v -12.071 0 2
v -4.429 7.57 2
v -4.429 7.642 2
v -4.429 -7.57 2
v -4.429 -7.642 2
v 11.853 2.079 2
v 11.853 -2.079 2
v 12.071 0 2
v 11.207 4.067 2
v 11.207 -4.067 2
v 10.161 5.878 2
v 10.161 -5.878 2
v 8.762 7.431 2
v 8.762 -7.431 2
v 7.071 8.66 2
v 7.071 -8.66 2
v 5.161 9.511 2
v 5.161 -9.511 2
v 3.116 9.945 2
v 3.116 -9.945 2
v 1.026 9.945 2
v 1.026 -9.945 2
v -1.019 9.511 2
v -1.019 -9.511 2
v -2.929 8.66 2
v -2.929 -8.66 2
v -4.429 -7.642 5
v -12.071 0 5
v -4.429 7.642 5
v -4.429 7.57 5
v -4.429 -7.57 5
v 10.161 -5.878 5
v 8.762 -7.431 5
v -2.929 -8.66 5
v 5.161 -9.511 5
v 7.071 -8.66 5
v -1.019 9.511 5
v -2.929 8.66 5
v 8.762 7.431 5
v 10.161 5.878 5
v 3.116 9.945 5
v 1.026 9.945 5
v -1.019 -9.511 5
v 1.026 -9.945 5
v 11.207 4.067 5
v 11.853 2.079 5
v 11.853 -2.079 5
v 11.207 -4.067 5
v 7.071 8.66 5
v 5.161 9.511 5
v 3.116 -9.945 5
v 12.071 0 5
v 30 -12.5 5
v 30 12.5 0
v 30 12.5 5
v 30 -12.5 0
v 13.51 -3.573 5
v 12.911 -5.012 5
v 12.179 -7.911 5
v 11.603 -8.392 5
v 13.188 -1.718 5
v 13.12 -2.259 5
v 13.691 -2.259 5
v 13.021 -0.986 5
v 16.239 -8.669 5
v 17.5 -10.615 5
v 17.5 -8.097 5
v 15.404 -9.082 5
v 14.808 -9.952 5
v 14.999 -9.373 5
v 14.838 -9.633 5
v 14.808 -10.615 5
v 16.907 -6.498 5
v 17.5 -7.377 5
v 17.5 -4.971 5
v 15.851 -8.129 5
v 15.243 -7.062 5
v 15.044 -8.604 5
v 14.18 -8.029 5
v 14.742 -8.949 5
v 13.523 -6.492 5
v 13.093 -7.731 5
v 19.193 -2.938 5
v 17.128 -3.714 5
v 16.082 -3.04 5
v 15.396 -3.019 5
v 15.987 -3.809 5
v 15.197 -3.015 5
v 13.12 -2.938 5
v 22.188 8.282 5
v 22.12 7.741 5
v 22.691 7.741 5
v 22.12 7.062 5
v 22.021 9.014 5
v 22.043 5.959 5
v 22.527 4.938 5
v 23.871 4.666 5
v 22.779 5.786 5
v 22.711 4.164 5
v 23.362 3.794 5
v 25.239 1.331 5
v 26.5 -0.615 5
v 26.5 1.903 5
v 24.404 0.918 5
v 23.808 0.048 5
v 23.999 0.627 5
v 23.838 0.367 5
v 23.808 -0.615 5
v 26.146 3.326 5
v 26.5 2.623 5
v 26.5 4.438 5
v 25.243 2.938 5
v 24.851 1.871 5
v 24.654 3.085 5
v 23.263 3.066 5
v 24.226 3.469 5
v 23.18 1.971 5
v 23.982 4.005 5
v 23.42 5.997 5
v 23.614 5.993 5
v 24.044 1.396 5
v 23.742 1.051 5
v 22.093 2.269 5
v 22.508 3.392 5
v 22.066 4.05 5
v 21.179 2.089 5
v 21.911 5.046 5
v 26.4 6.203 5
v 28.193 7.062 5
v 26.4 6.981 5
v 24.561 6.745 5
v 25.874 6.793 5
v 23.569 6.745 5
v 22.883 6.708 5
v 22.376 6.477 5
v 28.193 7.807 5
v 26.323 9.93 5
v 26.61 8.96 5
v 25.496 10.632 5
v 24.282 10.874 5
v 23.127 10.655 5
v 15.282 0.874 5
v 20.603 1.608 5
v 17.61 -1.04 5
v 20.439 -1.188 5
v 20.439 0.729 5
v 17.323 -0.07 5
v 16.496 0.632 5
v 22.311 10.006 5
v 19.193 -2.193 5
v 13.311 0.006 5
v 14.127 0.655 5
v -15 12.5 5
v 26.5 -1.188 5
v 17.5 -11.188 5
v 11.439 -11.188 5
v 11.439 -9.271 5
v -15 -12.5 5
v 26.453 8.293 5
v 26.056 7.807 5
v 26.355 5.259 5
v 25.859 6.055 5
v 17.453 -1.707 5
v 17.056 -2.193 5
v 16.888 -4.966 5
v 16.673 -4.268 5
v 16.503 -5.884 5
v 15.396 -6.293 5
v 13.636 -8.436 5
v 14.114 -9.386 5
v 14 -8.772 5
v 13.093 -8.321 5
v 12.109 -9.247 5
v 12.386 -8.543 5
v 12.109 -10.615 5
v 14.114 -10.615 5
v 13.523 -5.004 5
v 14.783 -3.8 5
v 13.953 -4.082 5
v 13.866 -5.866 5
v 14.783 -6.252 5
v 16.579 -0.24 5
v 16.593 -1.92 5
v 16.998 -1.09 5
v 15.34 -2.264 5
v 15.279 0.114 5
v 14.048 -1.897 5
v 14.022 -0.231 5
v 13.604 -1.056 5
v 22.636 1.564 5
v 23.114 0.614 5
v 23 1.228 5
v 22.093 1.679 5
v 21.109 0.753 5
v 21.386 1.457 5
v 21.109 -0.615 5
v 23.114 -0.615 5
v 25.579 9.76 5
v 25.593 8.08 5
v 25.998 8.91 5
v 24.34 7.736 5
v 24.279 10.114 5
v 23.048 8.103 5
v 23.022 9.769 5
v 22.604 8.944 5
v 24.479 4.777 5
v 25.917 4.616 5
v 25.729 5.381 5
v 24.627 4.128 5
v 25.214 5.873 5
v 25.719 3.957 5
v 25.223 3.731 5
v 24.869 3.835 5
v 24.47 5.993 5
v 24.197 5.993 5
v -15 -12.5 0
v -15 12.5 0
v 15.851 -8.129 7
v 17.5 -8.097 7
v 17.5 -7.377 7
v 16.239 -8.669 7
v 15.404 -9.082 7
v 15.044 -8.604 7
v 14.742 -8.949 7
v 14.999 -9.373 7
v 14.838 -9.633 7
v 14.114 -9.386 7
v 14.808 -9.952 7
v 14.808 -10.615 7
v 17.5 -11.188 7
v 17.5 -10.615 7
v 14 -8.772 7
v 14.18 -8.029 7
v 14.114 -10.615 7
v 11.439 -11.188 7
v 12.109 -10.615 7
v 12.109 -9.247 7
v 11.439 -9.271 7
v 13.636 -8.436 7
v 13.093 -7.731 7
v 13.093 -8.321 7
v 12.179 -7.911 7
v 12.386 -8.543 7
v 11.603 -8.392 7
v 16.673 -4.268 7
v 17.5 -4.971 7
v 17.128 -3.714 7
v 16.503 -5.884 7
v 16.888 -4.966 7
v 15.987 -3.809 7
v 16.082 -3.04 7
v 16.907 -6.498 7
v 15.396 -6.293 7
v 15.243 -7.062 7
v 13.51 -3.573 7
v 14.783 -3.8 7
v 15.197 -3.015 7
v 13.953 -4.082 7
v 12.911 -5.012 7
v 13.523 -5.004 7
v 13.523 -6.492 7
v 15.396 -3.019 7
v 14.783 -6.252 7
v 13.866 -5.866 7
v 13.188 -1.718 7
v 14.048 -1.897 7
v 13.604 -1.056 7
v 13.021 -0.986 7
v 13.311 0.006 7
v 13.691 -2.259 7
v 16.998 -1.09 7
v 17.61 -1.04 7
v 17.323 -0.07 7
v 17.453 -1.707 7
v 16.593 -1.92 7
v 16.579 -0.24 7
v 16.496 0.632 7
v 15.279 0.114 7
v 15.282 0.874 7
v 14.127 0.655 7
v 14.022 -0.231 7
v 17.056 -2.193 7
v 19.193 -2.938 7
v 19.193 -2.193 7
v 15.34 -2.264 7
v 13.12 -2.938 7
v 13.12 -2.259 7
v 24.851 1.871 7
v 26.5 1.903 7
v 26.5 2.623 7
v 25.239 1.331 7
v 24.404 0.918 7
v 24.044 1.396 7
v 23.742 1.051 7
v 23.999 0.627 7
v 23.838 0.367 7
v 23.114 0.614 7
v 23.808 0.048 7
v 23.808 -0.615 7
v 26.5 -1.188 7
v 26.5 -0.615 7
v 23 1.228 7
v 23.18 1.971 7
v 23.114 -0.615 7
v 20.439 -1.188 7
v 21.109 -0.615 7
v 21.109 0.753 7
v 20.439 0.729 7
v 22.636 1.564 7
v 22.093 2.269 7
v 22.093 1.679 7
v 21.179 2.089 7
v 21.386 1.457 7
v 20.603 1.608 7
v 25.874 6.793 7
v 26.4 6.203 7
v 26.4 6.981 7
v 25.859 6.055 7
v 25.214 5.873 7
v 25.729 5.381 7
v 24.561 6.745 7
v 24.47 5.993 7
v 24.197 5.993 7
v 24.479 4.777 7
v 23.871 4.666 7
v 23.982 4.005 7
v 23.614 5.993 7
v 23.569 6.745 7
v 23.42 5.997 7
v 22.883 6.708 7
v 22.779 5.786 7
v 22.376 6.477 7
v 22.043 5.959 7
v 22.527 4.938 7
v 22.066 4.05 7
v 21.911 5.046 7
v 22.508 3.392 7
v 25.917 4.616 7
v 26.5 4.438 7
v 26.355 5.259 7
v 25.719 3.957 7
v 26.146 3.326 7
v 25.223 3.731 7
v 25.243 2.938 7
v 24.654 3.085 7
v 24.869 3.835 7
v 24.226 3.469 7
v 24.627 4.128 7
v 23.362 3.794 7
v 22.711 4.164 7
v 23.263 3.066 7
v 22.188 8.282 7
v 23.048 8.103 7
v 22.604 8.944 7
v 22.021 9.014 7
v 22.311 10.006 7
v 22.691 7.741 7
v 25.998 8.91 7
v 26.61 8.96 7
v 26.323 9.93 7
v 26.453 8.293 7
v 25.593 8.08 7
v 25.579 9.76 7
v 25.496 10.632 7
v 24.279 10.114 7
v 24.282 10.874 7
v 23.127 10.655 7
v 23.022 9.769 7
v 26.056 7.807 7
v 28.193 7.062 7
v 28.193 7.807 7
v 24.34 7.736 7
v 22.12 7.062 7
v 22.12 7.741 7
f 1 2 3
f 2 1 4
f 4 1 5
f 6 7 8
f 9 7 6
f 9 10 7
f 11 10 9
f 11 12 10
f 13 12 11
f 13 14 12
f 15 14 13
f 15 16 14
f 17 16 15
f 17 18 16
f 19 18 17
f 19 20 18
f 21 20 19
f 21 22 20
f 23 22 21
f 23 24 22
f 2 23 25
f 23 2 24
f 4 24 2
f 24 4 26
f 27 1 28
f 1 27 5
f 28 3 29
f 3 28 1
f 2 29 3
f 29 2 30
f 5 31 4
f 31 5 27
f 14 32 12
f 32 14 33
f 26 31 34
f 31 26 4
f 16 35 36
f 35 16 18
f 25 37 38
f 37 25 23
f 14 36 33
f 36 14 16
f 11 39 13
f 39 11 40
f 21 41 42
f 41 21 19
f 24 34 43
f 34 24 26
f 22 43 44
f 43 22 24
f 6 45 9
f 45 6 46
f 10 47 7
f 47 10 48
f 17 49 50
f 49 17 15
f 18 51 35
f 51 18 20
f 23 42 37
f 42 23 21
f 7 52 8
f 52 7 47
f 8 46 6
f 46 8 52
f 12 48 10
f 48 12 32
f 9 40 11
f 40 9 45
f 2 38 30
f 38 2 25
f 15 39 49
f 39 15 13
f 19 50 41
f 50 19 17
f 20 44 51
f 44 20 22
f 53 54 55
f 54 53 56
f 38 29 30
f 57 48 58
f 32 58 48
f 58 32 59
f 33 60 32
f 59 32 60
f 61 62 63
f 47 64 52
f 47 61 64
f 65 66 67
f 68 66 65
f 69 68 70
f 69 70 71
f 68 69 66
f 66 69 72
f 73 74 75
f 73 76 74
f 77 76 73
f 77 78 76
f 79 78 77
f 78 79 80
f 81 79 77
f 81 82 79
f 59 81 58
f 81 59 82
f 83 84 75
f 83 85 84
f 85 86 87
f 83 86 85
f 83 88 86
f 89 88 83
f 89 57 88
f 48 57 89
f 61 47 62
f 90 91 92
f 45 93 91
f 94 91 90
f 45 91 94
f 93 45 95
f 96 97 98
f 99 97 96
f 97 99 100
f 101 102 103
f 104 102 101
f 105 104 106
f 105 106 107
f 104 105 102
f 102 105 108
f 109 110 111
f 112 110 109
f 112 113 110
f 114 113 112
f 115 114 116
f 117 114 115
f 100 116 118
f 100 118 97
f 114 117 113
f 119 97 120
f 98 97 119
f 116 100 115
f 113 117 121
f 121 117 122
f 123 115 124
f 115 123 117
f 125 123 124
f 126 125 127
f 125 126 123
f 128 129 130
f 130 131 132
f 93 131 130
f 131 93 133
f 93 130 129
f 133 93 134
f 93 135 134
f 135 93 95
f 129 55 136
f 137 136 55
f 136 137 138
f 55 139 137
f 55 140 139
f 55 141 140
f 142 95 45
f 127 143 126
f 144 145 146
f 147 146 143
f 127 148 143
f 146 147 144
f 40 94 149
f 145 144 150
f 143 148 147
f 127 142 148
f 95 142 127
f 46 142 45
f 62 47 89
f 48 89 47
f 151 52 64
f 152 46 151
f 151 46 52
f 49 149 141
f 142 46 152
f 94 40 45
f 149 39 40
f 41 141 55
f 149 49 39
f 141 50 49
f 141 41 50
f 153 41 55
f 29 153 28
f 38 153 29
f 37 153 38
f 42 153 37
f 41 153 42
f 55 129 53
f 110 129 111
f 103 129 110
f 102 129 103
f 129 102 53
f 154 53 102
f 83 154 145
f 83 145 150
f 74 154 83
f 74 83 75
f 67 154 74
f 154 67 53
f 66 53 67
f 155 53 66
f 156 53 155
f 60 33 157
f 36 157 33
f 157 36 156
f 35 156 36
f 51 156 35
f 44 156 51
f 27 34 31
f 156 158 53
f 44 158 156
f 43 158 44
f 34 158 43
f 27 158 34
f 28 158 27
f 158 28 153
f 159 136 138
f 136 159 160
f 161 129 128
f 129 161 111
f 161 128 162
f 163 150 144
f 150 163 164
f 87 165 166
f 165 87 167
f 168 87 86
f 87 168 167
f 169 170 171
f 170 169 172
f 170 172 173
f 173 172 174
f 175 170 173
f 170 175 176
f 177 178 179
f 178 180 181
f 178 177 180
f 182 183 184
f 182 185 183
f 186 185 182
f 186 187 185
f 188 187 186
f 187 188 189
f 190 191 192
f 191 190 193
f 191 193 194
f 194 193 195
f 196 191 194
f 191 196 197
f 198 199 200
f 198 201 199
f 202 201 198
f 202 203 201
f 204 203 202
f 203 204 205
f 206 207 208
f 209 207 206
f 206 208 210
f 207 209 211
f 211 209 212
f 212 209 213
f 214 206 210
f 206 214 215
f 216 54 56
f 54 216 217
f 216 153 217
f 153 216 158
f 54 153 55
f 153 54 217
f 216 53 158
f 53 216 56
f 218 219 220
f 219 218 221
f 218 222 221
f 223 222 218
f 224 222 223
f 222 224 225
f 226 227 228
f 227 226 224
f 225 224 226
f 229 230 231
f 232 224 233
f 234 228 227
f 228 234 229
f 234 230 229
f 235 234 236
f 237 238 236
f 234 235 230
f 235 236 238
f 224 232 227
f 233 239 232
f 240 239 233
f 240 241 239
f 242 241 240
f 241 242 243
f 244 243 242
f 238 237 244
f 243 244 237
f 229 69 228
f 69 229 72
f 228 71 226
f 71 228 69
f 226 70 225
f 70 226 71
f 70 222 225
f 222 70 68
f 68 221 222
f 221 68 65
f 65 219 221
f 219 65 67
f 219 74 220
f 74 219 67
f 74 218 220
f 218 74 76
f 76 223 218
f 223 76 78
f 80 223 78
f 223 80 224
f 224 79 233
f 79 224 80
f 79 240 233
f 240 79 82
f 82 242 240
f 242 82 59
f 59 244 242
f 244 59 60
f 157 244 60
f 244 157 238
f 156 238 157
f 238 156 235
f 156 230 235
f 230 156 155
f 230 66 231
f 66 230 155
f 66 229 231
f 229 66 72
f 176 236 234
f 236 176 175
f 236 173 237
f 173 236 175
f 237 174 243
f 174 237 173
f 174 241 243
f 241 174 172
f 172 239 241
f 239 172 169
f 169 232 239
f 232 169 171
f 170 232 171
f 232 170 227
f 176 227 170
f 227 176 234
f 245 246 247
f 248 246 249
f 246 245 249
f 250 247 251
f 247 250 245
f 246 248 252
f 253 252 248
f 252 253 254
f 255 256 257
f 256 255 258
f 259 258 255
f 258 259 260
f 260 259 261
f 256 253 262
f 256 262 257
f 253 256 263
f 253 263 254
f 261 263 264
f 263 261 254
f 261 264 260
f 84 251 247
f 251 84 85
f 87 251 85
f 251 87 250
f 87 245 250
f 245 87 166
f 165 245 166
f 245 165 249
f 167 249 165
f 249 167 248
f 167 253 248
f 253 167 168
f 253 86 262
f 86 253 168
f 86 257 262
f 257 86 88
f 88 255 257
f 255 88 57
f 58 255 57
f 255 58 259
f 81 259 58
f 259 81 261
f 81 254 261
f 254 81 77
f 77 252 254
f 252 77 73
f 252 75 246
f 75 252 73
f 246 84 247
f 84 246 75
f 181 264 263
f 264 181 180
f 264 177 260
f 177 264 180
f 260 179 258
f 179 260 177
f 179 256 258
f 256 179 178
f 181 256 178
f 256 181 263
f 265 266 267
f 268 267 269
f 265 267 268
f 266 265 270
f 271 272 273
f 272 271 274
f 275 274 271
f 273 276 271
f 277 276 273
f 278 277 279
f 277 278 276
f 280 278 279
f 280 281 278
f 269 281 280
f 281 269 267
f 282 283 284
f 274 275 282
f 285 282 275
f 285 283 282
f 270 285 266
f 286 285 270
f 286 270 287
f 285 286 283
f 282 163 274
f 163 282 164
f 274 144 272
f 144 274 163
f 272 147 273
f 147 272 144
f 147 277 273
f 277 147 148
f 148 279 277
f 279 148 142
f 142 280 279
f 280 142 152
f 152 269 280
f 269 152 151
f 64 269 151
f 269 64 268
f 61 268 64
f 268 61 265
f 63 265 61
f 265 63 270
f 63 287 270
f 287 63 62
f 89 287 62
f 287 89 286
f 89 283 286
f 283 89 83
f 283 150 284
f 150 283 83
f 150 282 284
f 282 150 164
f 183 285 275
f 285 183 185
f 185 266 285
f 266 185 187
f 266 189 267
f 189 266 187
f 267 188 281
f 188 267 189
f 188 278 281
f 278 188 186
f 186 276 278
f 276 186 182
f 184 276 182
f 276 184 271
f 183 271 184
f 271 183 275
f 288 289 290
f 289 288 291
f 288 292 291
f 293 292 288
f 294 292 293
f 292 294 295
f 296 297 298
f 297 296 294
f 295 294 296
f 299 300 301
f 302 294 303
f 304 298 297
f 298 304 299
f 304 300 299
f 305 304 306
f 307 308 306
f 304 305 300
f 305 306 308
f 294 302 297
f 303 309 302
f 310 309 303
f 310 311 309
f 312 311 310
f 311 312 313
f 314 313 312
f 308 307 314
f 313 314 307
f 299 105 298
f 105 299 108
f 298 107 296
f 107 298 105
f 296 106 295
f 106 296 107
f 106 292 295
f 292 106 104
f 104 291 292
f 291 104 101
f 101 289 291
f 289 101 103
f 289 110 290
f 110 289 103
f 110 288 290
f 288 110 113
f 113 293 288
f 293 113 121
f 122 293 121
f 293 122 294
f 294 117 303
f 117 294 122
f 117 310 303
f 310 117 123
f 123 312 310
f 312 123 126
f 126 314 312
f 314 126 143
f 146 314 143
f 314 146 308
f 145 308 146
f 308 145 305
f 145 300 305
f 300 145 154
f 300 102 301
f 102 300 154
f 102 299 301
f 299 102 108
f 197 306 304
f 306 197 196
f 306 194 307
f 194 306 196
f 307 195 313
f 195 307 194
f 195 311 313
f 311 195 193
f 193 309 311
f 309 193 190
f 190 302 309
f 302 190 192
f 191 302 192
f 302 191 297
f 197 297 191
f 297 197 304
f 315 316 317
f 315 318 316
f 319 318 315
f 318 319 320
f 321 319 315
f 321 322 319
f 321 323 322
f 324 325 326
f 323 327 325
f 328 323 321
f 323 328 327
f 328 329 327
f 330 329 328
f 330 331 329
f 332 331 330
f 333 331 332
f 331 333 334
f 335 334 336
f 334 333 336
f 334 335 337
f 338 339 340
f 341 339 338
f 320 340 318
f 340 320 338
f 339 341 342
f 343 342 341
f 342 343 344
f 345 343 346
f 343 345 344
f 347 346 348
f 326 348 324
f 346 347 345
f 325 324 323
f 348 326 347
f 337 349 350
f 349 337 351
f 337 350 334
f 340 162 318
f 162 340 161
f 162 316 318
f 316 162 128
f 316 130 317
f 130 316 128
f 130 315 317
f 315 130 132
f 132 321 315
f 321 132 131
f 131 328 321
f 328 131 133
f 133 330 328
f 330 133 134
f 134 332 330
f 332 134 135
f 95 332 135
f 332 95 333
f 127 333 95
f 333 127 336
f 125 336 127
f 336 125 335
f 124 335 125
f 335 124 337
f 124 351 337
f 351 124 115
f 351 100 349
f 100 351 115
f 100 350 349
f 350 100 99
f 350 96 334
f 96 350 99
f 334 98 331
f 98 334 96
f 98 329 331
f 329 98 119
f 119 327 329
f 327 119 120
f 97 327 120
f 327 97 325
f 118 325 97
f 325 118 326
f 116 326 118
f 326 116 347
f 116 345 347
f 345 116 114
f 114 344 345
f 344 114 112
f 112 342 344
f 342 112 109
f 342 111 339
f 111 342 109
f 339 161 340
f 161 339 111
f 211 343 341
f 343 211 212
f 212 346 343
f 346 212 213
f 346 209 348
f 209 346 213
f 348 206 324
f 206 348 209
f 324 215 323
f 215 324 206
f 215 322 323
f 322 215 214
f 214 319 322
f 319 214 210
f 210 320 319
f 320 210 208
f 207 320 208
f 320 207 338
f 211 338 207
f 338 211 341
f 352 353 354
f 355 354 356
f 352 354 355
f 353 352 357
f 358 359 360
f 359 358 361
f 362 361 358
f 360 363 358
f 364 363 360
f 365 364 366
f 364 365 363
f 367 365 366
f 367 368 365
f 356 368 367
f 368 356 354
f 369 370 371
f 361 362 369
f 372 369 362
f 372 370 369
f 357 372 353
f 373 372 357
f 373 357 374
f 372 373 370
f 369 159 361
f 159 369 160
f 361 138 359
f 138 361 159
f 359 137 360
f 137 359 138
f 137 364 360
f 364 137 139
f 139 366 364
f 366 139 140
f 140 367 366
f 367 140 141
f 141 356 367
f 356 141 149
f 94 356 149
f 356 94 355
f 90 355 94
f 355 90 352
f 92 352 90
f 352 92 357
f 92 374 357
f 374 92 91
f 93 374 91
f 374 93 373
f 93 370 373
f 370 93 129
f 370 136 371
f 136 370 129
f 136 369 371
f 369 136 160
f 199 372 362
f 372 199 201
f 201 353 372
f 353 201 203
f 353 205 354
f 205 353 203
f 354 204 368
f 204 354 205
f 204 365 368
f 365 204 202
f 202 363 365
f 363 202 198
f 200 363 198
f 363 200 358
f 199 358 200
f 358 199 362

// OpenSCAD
///////////////////////////////////////////////////////////////////////////////OpenSCAD///////////////////
/*///////////////////////////////////////////////////

date started:	6/13/2013
date finished:
modeler:			Patrick Conner
copyright:		N/A

*/


//////////////////////////////////////////////////////////////////////////////perameters////////////////////////////////////////////////////////////////////

include<Write.scad>

h = 6;

t = 4;

width = 25;

height = 45;

//////////////////////////////////////////////////////////////////////////////renders///////////////////////////////////////////////////////////////////////


reprap_logo();





//////////////////////////////////////////////////////////////////////////////modules///////////////////////////////////////////////////////////////////////

module example(){
	for(x = [0:1/3:1]){
		translate([x*height*4,0,0])
			for(y = [0:1/5:1]){
				translate([0,y*width*8,0])
					color([x,y,y-x],1)
						reprap_logo();
			}
	}
}

module reprap_logo(){
	union(){
		difference(){
			translate([-height/3,-width/2,0])
				cube([height,width,5]);
			translate([0,0,2])
				rotate([0,-90,0])
					TearDrop((width-5)/2,6);
		}
			translate([height/2-8,-5,5])
				rotate([0,0,90])
					write("Rep",center=true);
			translate([height/2+1,5,5])
				rotate([0,0,90])
					write("Rap",center=true);
	}
}	

module TearDrop(radius,depth)
{
  teardiff = (	sqrt(	( (radius * 2) * (radius * 2) ) * 2 ) - (radius * 2) ) / 2;
  translate(v = [depth/2,0,-teardiff / 2])
  rotate(a = [0,-90,0])
  union()
  {
    cylinder(h=depth,r=radius, center = true);
    intersection()
    {
      rotate(a = [0,0,45])
      cube([2*radius,2*radius,depth], center = true);
      translate([1.65*radius, 0, 0])
      cube([2*radius,2*radius,depth], center = true);
    }
  }
}
